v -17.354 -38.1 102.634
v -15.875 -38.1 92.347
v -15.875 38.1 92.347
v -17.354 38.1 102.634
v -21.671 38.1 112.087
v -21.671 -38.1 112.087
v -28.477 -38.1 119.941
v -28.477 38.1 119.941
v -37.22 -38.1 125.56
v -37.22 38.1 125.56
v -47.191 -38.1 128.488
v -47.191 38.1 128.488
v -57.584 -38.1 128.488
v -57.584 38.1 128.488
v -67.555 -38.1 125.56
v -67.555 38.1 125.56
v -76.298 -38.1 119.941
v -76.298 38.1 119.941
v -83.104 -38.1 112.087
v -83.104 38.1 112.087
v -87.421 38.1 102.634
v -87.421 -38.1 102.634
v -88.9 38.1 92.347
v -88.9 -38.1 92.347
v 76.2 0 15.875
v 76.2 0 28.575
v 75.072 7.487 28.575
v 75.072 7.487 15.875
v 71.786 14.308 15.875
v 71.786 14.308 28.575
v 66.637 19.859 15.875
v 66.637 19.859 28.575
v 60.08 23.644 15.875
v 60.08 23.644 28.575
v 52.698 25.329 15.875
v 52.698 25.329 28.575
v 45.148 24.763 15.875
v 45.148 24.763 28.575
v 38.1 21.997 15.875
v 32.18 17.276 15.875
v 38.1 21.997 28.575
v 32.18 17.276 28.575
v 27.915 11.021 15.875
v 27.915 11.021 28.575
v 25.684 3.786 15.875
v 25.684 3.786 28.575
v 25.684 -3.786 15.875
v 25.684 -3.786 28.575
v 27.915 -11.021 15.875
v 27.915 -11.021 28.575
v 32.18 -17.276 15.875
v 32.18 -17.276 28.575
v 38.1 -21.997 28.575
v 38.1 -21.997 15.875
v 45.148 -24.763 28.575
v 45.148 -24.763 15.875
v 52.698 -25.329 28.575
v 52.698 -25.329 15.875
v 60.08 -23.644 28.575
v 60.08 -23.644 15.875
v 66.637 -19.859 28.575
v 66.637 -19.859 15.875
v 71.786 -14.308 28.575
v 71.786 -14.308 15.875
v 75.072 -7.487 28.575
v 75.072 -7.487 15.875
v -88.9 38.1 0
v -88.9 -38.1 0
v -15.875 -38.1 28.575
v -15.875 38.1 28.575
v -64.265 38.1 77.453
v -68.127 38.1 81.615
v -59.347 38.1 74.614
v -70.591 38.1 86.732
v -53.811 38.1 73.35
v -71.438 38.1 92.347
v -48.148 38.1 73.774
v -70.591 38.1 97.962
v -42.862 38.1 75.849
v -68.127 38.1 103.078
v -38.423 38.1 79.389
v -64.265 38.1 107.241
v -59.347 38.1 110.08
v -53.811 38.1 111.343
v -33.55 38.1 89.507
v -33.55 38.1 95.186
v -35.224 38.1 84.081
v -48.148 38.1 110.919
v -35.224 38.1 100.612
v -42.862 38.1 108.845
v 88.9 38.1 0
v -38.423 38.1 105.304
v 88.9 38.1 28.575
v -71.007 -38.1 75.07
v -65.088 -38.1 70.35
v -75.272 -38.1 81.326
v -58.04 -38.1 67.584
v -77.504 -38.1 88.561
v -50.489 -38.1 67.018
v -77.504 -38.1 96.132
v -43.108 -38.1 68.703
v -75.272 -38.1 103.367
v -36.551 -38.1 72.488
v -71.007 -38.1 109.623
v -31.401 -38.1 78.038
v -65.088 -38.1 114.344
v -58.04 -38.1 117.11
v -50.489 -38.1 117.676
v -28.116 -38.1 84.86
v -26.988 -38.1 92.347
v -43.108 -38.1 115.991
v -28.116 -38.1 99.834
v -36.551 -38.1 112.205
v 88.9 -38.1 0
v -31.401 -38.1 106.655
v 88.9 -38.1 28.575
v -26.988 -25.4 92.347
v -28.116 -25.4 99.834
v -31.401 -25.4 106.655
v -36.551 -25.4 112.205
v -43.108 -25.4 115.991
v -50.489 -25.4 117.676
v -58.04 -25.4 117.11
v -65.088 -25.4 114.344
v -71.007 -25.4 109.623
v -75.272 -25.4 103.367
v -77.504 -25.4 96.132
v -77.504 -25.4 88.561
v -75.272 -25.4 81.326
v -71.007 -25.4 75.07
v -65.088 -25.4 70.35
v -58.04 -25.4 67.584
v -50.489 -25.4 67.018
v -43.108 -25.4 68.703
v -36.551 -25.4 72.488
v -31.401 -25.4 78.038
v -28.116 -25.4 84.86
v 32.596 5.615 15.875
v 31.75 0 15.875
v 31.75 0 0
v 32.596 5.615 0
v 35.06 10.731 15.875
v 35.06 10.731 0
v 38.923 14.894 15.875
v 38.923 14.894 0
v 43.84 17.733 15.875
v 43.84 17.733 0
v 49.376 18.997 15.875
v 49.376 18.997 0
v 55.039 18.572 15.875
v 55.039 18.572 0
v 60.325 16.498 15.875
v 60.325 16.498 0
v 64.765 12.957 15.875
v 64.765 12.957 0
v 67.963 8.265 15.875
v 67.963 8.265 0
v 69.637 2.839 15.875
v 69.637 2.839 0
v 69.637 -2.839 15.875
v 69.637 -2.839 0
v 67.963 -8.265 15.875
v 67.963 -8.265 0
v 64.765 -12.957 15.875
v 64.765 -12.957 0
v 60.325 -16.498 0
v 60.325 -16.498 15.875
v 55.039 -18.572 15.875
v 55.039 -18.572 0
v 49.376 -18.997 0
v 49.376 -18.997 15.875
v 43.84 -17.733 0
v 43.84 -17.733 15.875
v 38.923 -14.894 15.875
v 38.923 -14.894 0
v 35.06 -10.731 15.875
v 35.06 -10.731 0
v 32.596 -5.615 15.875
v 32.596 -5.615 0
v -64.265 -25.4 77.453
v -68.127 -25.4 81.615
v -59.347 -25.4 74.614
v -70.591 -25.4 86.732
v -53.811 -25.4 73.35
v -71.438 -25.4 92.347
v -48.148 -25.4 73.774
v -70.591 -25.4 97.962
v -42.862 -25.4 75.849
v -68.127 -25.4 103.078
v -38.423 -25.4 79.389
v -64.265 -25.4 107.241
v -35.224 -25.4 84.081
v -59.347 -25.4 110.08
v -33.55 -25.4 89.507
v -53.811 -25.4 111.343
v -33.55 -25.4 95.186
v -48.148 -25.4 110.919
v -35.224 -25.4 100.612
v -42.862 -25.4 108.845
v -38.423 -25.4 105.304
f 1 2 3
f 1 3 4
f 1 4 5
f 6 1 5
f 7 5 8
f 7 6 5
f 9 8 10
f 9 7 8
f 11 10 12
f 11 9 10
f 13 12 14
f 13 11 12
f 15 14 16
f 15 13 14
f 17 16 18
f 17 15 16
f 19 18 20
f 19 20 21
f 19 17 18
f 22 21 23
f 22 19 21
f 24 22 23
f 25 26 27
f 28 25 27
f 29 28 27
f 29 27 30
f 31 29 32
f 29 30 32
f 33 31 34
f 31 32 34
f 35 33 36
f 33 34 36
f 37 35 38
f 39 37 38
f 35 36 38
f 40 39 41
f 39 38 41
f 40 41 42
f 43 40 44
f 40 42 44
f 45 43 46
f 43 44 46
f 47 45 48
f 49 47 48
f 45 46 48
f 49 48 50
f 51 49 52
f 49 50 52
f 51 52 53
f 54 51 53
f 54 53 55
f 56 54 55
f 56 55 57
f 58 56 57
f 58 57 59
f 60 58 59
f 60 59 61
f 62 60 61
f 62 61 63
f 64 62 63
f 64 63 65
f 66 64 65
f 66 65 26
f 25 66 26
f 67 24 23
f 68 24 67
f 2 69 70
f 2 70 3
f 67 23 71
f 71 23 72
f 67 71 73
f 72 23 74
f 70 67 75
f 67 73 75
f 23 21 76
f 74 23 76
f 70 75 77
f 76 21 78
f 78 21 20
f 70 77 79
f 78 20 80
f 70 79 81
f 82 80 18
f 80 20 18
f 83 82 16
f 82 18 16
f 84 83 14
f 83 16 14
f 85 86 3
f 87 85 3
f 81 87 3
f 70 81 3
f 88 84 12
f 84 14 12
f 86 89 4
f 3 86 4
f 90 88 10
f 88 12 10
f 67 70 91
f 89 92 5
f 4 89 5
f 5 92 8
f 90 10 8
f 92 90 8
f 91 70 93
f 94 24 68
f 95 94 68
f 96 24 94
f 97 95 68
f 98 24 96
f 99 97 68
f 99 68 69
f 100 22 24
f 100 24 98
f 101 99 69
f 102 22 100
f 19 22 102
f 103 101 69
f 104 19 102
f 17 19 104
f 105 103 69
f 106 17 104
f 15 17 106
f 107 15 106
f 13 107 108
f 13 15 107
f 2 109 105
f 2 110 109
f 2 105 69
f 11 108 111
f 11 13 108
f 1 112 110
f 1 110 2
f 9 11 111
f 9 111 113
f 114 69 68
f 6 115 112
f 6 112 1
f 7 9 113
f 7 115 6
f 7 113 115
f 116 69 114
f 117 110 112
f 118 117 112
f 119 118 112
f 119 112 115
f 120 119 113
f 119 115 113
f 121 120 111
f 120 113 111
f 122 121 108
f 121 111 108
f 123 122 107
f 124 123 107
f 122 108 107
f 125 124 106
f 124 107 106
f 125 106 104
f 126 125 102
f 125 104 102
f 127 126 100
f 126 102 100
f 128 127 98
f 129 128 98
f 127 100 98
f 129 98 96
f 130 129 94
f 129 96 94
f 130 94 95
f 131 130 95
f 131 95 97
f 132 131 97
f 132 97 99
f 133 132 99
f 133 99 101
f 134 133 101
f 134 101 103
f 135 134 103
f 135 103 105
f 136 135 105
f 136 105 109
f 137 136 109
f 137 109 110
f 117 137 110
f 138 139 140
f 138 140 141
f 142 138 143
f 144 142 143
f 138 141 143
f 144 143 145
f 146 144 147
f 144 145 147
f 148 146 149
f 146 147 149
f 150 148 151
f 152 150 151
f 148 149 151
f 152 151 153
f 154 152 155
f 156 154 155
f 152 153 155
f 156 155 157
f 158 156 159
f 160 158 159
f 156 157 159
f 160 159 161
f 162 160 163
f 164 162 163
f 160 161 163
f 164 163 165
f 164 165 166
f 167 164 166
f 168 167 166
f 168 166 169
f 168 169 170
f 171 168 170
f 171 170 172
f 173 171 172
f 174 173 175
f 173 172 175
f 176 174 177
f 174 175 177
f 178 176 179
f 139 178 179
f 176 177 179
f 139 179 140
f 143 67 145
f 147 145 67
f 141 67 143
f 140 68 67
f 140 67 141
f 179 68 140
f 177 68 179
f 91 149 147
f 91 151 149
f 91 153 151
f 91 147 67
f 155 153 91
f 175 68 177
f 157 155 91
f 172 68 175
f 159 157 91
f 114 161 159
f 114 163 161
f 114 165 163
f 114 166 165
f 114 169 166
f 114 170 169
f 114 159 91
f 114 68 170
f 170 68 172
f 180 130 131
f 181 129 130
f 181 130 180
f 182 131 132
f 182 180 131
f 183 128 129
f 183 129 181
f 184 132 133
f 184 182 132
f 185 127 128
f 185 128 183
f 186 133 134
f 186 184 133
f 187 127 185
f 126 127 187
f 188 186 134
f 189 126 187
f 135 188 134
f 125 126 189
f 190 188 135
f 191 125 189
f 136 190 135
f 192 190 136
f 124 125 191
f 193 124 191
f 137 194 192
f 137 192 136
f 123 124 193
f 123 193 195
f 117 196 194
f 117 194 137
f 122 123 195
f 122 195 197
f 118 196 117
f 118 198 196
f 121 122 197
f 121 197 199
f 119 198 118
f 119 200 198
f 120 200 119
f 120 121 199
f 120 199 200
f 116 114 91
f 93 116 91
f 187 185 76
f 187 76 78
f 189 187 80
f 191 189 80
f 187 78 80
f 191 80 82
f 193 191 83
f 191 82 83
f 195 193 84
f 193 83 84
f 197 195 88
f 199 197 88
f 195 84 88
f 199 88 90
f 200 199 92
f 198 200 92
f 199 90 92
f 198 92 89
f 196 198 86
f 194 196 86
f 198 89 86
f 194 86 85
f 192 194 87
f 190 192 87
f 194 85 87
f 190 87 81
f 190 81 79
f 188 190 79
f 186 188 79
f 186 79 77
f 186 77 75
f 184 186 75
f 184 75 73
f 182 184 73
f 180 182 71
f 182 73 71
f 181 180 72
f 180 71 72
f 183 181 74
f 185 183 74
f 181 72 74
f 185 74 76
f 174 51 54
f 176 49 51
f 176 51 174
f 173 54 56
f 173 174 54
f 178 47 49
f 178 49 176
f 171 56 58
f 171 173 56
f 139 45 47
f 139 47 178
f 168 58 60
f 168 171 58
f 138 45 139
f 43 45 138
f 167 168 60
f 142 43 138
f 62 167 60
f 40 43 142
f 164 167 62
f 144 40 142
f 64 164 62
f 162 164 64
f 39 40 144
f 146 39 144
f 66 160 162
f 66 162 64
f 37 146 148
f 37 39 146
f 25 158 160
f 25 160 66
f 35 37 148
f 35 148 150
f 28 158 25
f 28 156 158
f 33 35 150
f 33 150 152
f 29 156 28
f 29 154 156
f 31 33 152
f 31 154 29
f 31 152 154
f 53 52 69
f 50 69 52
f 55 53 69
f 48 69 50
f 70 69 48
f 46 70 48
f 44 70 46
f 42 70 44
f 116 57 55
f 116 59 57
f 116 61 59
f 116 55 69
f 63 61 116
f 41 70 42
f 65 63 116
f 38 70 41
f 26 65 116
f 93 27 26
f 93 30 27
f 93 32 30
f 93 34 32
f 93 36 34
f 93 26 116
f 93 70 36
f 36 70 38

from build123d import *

# Parameters (mm, degrees)
F0_W           = 125.521261
F0_H           = 76.2
F1_DEPTH       = 28.575
F3_D           = 38.1
F3_CBORE_D     = 50.8
F3_CBORE_DEPTH = 12.7
F5_DEPTH       = 76.2
F6_D           = 38.1
F6_CBORE_D     = 50.8
F6_CBORE_DEPTH = 12.7


with BuildPart() as f1:
    # F0 (on Top) → F1 (new body)
    with BuildSketch(Plane.XY):
        with Locations((26.139369, 0)):
            Rectangle(F0_W, F0_H)
    extrude(amount=F1_DEPTH)

    # F3 (through all)
    with Locations(Plane.XY.offset(28.575)):
        with Locations((50.8, 0)):
            CounterBoreHole(F3_D / 2, F3_CBORE_D / 2, F3_CBORE_DEPTH)

    # F4 (on face) → F5 (join)
    with BuildSketch(Plane.XZ.offset(38.1)):
        Polygon((-88.9, 92.346745), (-88.9, 0), (-36.621261, 0), (-36.621261, 28.575), (-15.875, 28.575), (-15.875, 92.346745), align=None)
        with BuildLine():
            ThreePointArc((-15.875, 92.346745), (-52.3875, 128.859245), (-88.9, 92.346745))
            Line((-88.9, 92.346745), (-15.875, 92.346745))
        make_face()
    extrude(amount=-F5_DEPTH)

    # F6 (through all)
    with Locations(Plane.XZ.offset(38.1)):
        with Locations((-52.3875, 92.346745)):
            CounterBoreHole(F6_D / 2, F6_CBORE_D / 2, F6_CBORE_DEPTH)


solid = f1.part
